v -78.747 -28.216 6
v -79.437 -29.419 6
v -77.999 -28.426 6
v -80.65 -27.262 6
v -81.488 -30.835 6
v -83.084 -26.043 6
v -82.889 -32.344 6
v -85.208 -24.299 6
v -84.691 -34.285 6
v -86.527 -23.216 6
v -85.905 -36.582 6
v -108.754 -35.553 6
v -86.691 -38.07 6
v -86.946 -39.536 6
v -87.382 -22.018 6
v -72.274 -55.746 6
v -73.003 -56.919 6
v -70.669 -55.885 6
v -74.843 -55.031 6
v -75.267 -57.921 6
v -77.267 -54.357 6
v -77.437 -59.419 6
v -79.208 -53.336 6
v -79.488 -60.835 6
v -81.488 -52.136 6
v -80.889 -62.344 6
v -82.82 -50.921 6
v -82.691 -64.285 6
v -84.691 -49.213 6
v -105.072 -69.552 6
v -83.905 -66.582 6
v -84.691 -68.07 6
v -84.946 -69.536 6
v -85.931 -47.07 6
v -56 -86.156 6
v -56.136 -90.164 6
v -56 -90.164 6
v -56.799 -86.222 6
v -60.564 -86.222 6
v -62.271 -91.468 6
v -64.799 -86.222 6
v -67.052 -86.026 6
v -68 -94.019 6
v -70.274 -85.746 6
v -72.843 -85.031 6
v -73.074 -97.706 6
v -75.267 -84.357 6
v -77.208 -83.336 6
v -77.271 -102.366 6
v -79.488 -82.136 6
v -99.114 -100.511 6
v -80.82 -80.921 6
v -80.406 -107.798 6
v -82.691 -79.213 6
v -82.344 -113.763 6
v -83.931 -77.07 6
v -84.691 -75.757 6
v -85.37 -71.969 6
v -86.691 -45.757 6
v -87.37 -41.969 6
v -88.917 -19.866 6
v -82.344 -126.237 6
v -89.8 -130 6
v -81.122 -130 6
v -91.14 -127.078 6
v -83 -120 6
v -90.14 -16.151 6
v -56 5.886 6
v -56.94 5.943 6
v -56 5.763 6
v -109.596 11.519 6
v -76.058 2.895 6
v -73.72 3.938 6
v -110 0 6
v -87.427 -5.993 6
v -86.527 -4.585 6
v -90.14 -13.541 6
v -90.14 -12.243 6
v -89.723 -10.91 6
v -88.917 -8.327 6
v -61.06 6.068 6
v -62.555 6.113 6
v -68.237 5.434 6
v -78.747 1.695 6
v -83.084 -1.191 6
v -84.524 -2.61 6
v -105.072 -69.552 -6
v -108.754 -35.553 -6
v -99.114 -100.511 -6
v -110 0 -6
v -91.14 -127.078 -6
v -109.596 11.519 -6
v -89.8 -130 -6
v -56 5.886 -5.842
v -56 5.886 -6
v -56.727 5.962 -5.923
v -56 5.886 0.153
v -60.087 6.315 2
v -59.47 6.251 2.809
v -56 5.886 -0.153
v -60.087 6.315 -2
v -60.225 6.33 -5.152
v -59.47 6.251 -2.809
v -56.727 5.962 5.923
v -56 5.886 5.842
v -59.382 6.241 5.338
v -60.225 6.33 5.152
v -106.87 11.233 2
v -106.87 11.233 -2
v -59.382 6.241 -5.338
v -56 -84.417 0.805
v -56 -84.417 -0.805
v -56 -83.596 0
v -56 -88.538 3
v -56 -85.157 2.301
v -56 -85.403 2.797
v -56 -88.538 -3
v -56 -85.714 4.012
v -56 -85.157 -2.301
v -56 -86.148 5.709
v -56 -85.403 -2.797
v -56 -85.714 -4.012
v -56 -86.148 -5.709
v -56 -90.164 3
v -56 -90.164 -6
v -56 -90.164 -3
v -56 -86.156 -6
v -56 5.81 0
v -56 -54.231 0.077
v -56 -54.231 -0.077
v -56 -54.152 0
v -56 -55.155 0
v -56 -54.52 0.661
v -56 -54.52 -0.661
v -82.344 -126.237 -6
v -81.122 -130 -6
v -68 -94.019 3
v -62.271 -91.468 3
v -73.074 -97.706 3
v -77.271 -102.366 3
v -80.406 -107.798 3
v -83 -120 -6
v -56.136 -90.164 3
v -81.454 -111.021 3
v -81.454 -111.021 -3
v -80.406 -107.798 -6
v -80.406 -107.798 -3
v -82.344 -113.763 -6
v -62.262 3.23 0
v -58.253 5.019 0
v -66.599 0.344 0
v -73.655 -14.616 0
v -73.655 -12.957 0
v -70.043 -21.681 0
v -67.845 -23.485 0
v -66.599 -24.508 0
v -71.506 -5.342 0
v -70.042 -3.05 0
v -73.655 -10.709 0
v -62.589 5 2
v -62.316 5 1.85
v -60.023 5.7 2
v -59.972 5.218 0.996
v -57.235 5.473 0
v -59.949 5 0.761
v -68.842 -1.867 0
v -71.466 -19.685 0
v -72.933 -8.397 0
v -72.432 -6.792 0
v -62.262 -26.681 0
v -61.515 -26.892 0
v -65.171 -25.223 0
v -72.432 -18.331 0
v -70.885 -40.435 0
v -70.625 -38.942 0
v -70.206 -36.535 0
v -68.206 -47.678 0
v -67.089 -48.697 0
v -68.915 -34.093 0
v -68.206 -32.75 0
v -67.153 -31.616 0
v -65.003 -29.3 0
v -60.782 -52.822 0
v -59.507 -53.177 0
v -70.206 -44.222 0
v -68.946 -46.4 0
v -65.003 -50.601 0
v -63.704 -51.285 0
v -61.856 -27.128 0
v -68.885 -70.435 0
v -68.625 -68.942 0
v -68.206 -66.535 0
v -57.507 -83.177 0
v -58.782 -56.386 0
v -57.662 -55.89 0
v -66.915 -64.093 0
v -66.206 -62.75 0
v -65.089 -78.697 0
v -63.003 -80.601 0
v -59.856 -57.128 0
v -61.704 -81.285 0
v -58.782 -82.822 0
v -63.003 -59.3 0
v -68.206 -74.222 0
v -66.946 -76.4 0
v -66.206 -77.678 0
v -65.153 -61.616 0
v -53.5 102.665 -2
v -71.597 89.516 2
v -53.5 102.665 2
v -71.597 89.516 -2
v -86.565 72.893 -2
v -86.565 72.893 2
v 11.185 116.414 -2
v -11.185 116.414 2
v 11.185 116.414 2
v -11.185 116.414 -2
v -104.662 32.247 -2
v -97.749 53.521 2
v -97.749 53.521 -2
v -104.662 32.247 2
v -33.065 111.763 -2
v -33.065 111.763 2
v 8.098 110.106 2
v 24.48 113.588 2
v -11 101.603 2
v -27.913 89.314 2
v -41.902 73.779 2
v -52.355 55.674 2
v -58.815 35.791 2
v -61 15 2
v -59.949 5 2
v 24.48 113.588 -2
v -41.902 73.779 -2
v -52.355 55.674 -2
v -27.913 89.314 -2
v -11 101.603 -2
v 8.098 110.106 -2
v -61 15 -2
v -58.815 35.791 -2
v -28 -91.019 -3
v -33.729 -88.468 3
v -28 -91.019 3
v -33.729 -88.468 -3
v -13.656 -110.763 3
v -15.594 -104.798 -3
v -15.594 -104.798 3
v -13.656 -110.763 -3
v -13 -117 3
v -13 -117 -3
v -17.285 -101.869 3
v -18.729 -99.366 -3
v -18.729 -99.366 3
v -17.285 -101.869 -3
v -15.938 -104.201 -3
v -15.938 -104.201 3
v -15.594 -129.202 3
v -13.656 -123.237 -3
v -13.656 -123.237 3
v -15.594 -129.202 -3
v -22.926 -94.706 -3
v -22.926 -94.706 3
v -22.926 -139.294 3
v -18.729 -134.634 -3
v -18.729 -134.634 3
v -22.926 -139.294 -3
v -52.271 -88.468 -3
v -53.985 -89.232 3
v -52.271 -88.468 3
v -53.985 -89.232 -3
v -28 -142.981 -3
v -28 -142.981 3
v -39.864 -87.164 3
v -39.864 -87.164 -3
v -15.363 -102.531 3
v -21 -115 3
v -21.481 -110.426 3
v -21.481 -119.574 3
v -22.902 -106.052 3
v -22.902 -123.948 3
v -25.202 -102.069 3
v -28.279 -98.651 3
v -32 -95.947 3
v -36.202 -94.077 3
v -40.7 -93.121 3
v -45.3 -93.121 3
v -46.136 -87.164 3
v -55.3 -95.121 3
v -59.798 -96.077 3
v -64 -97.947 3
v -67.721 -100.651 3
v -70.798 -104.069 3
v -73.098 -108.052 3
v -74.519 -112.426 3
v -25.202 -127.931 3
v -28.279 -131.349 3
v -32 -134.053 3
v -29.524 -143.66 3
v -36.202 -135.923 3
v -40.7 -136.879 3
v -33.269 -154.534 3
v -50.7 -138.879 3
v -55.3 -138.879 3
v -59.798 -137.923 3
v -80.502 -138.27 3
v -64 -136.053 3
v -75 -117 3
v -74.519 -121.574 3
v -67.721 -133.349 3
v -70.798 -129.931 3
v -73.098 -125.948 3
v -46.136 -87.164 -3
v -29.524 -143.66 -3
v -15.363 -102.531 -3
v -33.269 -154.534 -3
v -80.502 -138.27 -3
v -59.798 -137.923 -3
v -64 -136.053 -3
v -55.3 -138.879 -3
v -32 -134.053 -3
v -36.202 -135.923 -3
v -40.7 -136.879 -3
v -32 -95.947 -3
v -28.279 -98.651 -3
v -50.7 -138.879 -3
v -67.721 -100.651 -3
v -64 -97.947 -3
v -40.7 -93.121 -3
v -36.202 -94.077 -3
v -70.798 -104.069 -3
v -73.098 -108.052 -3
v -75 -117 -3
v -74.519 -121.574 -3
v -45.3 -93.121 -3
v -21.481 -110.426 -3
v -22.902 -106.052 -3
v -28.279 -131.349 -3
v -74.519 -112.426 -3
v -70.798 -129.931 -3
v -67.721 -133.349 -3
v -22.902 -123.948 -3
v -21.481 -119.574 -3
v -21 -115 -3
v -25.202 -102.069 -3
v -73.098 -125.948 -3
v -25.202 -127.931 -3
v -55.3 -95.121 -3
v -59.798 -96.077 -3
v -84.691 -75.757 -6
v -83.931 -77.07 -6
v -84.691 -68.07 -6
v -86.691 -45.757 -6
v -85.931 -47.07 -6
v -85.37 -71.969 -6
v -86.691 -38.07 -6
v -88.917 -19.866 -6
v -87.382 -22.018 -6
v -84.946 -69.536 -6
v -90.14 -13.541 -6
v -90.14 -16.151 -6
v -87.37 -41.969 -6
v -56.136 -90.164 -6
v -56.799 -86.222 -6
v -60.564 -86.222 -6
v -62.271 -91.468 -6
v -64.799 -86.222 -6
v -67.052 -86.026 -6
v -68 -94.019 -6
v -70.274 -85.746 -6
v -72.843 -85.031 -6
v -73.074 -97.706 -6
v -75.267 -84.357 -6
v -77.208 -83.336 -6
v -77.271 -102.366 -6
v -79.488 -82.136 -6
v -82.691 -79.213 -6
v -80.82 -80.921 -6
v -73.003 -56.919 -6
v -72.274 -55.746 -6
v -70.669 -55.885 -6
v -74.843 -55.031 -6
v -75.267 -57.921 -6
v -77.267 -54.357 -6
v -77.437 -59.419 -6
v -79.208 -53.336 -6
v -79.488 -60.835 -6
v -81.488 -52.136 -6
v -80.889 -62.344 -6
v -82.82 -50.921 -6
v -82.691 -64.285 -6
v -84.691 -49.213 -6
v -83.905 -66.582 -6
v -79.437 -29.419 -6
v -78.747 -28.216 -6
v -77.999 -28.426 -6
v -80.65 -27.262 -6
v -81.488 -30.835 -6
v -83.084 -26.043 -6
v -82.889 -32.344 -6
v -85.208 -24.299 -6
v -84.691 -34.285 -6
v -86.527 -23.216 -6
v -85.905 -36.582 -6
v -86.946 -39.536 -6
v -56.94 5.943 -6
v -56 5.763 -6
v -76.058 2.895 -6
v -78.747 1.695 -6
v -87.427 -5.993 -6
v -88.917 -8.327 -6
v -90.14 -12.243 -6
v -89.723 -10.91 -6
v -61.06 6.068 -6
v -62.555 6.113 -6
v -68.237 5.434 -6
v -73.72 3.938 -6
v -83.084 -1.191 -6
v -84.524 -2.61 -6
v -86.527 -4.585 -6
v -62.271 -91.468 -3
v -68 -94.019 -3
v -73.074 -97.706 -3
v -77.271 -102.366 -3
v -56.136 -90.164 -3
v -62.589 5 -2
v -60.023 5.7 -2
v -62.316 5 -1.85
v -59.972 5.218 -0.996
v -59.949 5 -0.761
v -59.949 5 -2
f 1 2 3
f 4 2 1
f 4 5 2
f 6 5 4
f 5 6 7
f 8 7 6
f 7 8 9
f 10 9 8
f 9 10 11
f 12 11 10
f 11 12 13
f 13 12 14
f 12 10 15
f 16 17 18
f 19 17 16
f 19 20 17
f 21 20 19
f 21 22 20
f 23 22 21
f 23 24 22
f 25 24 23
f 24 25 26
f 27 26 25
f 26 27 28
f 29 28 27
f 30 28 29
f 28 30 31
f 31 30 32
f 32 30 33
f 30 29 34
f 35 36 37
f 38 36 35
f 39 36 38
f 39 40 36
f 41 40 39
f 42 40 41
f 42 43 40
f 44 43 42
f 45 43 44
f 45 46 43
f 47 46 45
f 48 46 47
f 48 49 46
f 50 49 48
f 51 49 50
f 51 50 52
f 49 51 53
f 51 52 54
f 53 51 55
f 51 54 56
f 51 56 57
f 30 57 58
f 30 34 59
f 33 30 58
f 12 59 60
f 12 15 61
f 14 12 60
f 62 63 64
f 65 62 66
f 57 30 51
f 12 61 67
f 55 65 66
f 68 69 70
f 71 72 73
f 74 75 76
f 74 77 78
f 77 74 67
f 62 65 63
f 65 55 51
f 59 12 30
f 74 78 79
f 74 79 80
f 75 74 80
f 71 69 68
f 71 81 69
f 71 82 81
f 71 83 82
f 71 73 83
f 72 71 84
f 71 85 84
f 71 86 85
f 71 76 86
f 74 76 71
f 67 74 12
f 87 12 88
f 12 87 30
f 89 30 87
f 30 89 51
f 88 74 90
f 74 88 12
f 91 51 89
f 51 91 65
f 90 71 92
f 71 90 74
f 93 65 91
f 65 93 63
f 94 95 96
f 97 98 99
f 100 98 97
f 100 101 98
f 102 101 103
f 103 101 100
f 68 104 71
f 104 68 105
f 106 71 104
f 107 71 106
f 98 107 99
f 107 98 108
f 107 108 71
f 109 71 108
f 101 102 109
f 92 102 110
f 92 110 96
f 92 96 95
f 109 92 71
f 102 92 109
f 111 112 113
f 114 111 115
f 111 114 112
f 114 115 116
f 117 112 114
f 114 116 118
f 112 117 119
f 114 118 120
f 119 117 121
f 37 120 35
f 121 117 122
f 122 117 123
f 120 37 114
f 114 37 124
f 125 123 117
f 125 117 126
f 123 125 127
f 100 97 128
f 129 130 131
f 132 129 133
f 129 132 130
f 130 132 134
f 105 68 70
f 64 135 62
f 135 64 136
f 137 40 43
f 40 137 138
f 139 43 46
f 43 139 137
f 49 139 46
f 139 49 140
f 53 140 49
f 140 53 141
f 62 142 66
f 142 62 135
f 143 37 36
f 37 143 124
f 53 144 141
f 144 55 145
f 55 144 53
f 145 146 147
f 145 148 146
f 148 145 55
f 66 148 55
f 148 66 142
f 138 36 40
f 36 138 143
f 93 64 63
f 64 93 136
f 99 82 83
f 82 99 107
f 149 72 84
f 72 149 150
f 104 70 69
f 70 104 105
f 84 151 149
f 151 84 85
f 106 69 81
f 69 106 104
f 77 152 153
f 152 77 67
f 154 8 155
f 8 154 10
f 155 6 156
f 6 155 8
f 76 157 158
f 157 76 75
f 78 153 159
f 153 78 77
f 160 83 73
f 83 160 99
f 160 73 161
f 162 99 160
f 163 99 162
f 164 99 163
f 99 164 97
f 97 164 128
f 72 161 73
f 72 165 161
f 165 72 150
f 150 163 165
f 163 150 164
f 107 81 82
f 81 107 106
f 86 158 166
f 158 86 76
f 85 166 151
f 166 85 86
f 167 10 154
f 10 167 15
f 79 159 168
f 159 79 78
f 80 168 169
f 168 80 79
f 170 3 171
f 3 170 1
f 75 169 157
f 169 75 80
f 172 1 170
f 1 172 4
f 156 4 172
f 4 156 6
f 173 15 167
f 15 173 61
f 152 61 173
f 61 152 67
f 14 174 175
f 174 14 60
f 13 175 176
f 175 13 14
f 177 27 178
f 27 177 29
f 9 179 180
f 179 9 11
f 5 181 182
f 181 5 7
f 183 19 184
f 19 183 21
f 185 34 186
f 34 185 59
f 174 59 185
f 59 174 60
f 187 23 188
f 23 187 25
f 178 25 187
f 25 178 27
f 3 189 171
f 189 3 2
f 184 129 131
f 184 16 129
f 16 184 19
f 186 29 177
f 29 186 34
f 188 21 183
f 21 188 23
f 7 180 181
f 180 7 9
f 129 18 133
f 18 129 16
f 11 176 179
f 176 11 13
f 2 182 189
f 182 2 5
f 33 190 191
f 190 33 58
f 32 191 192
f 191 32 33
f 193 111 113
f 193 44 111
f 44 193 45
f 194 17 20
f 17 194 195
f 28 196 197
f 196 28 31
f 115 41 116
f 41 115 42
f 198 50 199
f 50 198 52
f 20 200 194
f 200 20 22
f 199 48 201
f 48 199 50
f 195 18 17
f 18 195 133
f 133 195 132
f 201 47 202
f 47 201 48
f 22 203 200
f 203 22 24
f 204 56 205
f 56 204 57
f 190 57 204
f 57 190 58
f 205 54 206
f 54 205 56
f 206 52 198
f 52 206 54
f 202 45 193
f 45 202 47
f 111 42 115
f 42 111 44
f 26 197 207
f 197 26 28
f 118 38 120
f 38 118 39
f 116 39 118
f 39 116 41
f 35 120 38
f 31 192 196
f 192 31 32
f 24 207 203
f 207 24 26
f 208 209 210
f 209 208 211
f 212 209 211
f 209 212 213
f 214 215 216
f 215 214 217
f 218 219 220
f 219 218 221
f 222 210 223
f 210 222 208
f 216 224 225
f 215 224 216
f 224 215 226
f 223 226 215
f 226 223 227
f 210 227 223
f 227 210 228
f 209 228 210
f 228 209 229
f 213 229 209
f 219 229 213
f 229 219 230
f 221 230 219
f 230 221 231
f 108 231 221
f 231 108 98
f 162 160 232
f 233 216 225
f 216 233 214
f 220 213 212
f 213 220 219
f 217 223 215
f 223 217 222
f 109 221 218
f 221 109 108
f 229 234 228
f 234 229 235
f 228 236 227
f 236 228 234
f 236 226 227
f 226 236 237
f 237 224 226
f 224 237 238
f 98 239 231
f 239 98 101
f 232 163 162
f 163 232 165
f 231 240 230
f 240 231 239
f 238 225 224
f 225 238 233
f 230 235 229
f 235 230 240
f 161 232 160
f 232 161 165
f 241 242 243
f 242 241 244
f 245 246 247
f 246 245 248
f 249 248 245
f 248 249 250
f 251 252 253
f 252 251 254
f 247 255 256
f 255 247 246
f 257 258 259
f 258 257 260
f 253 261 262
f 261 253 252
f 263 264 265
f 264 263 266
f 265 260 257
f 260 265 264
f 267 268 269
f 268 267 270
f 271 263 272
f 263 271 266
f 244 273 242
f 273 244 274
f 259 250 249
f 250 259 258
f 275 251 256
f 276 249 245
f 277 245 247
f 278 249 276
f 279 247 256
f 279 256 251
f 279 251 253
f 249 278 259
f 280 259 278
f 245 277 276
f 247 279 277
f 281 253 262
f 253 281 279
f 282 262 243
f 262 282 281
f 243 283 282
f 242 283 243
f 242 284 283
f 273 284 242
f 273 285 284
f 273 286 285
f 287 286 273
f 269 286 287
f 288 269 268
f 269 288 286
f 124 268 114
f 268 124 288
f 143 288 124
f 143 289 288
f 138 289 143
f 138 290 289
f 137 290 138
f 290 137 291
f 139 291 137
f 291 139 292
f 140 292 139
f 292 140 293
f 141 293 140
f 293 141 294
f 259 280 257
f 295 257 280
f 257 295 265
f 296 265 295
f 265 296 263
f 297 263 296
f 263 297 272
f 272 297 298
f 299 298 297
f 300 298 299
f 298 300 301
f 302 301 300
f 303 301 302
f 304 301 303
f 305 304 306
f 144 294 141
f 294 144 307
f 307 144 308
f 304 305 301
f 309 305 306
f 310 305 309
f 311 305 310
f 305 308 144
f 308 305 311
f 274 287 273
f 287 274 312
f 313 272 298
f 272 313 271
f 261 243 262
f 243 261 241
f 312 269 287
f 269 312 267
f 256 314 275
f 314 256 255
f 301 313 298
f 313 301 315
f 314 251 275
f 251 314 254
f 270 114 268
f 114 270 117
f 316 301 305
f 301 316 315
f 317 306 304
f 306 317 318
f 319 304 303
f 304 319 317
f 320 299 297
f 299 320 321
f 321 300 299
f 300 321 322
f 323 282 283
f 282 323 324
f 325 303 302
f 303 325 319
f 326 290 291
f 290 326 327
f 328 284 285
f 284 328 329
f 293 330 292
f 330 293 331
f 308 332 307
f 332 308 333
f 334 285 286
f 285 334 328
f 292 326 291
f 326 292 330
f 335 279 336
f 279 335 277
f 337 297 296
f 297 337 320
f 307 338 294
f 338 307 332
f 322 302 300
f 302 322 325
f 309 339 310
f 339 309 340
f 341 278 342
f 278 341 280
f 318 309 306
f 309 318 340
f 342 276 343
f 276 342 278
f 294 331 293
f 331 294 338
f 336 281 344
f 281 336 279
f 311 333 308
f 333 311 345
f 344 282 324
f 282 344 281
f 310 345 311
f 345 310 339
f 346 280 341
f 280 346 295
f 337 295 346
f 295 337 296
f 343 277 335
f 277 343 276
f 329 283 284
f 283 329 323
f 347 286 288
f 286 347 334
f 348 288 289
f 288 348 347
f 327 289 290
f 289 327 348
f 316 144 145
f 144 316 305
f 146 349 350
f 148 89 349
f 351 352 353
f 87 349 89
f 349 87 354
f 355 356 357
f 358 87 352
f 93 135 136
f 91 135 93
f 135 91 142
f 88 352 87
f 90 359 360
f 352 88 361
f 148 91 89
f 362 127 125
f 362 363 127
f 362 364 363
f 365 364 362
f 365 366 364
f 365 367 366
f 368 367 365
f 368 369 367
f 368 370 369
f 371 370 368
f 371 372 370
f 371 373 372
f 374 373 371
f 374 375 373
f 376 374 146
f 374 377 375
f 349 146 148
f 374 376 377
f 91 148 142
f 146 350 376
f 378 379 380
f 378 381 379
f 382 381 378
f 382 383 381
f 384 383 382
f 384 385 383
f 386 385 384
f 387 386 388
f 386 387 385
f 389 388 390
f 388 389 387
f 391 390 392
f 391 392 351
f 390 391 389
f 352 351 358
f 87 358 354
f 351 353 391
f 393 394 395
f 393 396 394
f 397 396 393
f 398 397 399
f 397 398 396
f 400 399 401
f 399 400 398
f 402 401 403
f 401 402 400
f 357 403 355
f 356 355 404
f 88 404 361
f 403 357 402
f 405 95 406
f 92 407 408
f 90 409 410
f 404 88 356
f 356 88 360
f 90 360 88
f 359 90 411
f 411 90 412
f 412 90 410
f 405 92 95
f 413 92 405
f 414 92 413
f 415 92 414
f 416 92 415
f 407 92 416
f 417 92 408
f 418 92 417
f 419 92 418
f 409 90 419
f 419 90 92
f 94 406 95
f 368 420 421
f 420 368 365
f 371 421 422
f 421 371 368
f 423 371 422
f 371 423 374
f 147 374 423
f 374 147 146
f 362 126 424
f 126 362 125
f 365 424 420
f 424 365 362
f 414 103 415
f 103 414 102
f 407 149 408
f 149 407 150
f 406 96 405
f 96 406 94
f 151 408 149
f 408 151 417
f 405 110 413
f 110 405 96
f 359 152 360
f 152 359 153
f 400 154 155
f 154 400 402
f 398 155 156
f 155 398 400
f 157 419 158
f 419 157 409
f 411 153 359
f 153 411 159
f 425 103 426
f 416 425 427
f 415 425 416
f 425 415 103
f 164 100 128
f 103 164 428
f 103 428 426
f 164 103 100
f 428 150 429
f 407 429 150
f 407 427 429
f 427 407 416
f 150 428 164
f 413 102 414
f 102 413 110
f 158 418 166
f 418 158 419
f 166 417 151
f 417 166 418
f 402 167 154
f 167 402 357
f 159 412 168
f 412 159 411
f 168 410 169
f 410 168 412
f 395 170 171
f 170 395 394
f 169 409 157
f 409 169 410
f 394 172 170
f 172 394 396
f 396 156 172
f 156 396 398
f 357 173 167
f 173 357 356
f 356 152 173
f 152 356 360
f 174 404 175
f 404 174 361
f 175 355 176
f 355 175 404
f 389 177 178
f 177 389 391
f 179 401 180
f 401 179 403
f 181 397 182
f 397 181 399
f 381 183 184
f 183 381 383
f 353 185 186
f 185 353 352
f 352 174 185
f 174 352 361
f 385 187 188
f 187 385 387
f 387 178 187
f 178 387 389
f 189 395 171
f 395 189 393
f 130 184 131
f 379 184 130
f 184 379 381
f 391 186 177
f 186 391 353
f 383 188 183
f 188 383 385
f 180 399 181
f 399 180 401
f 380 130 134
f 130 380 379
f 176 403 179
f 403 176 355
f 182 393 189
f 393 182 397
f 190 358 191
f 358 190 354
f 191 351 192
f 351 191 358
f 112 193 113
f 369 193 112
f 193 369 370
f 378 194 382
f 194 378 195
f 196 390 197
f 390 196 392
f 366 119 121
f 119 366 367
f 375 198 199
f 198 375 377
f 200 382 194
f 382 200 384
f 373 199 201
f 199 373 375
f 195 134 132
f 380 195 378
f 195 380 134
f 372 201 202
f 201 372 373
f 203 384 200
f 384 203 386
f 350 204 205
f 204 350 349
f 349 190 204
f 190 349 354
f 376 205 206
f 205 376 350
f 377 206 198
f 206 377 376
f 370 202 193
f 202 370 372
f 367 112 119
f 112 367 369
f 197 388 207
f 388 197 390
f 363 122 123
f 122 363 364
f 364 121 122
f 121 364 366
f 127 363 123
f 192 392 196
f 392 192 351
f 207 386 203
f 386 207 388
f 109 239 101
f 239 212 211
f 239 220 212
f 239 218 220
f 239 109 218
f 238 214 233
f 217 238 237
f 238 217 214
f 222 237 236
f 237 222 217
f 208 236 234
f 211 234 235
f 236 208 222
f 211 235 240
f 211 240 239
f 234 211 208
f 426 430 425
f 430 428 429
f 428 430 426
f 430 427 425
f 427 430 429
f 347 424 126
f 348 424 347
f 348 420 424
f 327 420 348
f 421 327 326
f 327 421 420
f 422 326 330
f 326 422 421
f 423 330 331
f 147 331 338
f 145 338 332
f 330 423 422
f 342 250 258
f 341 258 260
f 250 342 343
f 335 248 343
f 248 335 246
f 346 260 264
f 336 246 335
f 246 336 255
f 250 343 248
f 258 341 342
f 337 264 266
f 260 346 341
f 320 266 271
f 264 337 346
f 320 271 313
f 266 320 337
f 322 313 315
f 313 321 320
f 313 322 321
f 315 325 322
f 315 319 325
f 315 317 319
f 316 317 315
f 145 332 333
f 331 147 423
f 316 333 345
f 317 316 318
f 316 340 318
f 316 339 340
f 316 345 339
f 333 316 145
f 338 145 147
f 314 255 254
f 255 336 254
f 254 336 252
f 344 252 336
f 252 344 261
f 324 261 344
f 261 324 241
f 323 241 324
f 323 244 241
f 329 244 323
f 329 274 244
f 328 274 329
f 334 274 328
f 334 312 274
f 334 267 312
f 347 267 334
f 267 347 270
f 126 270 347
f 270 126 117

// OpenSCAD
toleranta=1;
module karambit(){
    //Maner    
    difference(){
    color("DimGray")translate([-53,0,0])scale(v = [1, 3, 1]) cylinder(h=4+2*toleranta,r=57);
    rotate([0,0,-6])translate([-125,0,-1])cube([170,165,6+2*toleranta]);
    translate([-56,-170,-1])cube([100,180,6+2*toleranta]);
    translate([-53,-120,-1])cylinder(h=6+2*toleranta,r=30);
    translate([-96,-174,-1])cube([50,44,6+2*toleranta]);    
    //forma deget 1
    hull(){
        translate([-42,-10,-2])rotate([5,-70,0])scale(v = [1, 2, 1]) cylinder(h=70+2*toleranta,r=9);
    translate([-40,-10,-2])rotate([5,-70,0])scale(v = [1, 2, 1]) cylinder(h=70+2*toleranta,r=8);
    }
    //forma deget 2
    hull(){
    translate([-42,-38,-2])rotate([5,-70,0])scale(v = [1, 2, 1]) cylinder(h=70+2*toleranta,r=8);
    translate([-32,-38,-2])rotate([5,-70,0])scale(v = [1, 2, 1]) cylinder(h=70+2*toleranta,r=8);
    }
    //forma deget 3
    hull(){
    translate([-40,-68,-2])rotate([5,-70,0])scale(v = [1, 2, 1]) cylinder(h=70+2*toleranta,r=8);
    translate([-32,-68,-2])rotate([5,-70,0])scale(v = [1, 2, 1]) cylinder(h=50+2*toleranta,r=8);
    }

};

    //-------------------------------------------------------------------
    //Lama   
    difference(){
        color("CadetBlue")translate([0,10,0])rotate([0,0,0])cylinder(h=2,r=107);
        translate([39,15,-1])cylinder(h=2+2*toleranta,r=100);
        translate([-100,-110,-1])cube([150,115,2+2*toleranta]);
            
        
           
     }
    //-------------------------------------------------------------------
    //Inel Metalic    
    difference(){    
        color("CadetBlue")union() {    
        translate([-43,-117,-1])cylinder(h=2+2*toleranta,r=30);
        translate([-90,-135,-1])rotate([0,0,-19])cube([60,55,2+2*toleranta]);    
    }
      hull(){
        translate([-43,-115,-2])cylinder(h=4+2*toleranta,r=22);
        translate([-53,-117,-2])cylinder(h=4+2*toleranta,r=22);
        }
        //translate([-120,-183,-2])rotate([0,0,-28])cube([60,55,4+2*toleranta]); 
        translate([-100,-153,-2])rotate([0,0,2])cube([20,45,4+2*toleranta]); 
      }
    }
    mirror([0,0,1])karambit();
    karambit();
